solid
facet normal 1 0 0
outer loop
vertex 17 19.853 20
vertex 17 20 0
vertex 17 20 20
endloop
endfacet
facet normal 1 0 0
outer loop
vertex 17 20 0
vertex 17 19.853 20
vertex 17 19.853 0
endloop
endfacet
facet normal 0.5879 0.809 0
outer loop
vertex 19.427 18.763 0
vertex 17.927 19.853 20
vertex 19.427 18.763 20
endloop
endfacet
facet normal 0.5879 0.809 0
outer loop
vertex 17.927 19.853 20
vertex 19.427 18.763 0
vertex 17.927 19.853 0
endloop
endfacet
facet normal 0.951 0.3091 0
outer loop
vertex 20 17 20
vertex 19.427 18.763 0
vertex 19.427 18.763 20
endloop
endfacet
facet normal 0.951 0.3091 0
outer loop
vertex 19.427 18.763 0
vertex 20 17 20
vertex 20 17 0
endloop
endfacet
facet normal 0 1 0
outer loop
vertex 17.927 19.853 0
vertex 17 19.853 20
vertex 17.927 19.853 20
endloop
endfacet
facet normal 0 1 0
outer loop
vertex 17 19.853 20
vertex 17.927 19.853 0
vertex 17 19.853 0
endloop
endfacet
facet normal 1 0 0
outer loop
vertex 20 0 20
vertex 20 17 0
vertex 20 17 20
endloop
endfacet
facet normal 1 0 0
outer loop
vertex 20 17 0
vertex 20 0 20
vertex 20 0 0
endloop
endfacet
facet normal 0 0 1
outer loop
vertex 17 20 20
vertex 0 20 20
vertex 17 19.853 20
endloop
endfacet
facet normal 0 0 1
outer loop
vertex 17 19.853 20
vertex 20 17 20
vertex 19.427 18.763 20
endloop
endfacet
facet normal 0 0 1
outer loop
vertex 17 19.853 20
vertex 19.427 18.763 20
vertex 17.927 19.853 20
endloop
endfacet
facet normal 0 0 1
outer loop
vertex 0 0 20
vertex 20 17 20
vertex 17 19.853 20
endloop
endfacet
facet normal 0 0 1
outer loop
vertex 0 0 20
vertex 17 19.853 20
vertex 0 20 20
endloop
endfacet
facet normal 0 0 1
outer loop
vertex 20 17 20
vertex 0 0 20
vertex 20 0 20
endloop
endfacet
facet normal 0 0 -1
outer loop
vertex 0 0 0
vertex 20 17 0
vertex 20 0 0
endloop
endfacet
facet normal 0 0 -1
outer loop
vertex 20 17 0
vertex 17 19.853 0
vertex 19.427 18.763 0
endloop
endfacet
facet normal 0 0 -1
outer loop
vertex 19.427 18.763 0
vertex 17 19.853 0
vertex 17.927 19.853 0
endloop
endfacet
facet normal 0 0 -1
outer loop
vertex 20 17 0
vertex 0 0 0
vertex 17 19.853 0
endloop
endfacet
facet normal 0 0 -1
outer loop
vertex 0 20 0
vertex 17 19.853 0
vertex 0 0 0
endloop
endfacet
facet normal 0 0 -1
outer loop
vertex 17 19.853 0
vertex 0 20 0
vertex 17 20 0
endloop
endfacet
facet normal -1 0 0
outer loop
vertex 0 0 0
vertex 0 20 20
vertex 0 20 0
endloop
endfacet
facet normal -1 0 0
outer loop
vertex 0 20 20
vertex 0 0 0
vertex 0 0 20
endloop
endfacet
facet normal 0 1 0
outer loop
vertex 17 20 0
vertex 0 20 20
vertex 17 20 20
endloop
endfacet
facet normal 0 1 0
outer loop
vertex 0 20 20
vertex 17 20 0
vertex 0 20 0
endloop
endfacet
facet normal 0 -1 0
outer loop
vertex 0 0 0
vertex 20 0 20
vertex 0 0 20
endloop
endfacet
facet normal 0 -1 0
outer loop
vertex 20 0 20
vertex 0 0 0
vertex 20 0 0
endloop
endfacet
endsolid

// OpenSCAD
// The exact-geometry audit's case f01 (docs/audits/exact-geometry-rust.md).
// volume: 7961.371669411541
difference() { cube(20); translate([17,17,-1]) difference() { cube([4,4,22]); cylinder(r=3, h=22); } }
